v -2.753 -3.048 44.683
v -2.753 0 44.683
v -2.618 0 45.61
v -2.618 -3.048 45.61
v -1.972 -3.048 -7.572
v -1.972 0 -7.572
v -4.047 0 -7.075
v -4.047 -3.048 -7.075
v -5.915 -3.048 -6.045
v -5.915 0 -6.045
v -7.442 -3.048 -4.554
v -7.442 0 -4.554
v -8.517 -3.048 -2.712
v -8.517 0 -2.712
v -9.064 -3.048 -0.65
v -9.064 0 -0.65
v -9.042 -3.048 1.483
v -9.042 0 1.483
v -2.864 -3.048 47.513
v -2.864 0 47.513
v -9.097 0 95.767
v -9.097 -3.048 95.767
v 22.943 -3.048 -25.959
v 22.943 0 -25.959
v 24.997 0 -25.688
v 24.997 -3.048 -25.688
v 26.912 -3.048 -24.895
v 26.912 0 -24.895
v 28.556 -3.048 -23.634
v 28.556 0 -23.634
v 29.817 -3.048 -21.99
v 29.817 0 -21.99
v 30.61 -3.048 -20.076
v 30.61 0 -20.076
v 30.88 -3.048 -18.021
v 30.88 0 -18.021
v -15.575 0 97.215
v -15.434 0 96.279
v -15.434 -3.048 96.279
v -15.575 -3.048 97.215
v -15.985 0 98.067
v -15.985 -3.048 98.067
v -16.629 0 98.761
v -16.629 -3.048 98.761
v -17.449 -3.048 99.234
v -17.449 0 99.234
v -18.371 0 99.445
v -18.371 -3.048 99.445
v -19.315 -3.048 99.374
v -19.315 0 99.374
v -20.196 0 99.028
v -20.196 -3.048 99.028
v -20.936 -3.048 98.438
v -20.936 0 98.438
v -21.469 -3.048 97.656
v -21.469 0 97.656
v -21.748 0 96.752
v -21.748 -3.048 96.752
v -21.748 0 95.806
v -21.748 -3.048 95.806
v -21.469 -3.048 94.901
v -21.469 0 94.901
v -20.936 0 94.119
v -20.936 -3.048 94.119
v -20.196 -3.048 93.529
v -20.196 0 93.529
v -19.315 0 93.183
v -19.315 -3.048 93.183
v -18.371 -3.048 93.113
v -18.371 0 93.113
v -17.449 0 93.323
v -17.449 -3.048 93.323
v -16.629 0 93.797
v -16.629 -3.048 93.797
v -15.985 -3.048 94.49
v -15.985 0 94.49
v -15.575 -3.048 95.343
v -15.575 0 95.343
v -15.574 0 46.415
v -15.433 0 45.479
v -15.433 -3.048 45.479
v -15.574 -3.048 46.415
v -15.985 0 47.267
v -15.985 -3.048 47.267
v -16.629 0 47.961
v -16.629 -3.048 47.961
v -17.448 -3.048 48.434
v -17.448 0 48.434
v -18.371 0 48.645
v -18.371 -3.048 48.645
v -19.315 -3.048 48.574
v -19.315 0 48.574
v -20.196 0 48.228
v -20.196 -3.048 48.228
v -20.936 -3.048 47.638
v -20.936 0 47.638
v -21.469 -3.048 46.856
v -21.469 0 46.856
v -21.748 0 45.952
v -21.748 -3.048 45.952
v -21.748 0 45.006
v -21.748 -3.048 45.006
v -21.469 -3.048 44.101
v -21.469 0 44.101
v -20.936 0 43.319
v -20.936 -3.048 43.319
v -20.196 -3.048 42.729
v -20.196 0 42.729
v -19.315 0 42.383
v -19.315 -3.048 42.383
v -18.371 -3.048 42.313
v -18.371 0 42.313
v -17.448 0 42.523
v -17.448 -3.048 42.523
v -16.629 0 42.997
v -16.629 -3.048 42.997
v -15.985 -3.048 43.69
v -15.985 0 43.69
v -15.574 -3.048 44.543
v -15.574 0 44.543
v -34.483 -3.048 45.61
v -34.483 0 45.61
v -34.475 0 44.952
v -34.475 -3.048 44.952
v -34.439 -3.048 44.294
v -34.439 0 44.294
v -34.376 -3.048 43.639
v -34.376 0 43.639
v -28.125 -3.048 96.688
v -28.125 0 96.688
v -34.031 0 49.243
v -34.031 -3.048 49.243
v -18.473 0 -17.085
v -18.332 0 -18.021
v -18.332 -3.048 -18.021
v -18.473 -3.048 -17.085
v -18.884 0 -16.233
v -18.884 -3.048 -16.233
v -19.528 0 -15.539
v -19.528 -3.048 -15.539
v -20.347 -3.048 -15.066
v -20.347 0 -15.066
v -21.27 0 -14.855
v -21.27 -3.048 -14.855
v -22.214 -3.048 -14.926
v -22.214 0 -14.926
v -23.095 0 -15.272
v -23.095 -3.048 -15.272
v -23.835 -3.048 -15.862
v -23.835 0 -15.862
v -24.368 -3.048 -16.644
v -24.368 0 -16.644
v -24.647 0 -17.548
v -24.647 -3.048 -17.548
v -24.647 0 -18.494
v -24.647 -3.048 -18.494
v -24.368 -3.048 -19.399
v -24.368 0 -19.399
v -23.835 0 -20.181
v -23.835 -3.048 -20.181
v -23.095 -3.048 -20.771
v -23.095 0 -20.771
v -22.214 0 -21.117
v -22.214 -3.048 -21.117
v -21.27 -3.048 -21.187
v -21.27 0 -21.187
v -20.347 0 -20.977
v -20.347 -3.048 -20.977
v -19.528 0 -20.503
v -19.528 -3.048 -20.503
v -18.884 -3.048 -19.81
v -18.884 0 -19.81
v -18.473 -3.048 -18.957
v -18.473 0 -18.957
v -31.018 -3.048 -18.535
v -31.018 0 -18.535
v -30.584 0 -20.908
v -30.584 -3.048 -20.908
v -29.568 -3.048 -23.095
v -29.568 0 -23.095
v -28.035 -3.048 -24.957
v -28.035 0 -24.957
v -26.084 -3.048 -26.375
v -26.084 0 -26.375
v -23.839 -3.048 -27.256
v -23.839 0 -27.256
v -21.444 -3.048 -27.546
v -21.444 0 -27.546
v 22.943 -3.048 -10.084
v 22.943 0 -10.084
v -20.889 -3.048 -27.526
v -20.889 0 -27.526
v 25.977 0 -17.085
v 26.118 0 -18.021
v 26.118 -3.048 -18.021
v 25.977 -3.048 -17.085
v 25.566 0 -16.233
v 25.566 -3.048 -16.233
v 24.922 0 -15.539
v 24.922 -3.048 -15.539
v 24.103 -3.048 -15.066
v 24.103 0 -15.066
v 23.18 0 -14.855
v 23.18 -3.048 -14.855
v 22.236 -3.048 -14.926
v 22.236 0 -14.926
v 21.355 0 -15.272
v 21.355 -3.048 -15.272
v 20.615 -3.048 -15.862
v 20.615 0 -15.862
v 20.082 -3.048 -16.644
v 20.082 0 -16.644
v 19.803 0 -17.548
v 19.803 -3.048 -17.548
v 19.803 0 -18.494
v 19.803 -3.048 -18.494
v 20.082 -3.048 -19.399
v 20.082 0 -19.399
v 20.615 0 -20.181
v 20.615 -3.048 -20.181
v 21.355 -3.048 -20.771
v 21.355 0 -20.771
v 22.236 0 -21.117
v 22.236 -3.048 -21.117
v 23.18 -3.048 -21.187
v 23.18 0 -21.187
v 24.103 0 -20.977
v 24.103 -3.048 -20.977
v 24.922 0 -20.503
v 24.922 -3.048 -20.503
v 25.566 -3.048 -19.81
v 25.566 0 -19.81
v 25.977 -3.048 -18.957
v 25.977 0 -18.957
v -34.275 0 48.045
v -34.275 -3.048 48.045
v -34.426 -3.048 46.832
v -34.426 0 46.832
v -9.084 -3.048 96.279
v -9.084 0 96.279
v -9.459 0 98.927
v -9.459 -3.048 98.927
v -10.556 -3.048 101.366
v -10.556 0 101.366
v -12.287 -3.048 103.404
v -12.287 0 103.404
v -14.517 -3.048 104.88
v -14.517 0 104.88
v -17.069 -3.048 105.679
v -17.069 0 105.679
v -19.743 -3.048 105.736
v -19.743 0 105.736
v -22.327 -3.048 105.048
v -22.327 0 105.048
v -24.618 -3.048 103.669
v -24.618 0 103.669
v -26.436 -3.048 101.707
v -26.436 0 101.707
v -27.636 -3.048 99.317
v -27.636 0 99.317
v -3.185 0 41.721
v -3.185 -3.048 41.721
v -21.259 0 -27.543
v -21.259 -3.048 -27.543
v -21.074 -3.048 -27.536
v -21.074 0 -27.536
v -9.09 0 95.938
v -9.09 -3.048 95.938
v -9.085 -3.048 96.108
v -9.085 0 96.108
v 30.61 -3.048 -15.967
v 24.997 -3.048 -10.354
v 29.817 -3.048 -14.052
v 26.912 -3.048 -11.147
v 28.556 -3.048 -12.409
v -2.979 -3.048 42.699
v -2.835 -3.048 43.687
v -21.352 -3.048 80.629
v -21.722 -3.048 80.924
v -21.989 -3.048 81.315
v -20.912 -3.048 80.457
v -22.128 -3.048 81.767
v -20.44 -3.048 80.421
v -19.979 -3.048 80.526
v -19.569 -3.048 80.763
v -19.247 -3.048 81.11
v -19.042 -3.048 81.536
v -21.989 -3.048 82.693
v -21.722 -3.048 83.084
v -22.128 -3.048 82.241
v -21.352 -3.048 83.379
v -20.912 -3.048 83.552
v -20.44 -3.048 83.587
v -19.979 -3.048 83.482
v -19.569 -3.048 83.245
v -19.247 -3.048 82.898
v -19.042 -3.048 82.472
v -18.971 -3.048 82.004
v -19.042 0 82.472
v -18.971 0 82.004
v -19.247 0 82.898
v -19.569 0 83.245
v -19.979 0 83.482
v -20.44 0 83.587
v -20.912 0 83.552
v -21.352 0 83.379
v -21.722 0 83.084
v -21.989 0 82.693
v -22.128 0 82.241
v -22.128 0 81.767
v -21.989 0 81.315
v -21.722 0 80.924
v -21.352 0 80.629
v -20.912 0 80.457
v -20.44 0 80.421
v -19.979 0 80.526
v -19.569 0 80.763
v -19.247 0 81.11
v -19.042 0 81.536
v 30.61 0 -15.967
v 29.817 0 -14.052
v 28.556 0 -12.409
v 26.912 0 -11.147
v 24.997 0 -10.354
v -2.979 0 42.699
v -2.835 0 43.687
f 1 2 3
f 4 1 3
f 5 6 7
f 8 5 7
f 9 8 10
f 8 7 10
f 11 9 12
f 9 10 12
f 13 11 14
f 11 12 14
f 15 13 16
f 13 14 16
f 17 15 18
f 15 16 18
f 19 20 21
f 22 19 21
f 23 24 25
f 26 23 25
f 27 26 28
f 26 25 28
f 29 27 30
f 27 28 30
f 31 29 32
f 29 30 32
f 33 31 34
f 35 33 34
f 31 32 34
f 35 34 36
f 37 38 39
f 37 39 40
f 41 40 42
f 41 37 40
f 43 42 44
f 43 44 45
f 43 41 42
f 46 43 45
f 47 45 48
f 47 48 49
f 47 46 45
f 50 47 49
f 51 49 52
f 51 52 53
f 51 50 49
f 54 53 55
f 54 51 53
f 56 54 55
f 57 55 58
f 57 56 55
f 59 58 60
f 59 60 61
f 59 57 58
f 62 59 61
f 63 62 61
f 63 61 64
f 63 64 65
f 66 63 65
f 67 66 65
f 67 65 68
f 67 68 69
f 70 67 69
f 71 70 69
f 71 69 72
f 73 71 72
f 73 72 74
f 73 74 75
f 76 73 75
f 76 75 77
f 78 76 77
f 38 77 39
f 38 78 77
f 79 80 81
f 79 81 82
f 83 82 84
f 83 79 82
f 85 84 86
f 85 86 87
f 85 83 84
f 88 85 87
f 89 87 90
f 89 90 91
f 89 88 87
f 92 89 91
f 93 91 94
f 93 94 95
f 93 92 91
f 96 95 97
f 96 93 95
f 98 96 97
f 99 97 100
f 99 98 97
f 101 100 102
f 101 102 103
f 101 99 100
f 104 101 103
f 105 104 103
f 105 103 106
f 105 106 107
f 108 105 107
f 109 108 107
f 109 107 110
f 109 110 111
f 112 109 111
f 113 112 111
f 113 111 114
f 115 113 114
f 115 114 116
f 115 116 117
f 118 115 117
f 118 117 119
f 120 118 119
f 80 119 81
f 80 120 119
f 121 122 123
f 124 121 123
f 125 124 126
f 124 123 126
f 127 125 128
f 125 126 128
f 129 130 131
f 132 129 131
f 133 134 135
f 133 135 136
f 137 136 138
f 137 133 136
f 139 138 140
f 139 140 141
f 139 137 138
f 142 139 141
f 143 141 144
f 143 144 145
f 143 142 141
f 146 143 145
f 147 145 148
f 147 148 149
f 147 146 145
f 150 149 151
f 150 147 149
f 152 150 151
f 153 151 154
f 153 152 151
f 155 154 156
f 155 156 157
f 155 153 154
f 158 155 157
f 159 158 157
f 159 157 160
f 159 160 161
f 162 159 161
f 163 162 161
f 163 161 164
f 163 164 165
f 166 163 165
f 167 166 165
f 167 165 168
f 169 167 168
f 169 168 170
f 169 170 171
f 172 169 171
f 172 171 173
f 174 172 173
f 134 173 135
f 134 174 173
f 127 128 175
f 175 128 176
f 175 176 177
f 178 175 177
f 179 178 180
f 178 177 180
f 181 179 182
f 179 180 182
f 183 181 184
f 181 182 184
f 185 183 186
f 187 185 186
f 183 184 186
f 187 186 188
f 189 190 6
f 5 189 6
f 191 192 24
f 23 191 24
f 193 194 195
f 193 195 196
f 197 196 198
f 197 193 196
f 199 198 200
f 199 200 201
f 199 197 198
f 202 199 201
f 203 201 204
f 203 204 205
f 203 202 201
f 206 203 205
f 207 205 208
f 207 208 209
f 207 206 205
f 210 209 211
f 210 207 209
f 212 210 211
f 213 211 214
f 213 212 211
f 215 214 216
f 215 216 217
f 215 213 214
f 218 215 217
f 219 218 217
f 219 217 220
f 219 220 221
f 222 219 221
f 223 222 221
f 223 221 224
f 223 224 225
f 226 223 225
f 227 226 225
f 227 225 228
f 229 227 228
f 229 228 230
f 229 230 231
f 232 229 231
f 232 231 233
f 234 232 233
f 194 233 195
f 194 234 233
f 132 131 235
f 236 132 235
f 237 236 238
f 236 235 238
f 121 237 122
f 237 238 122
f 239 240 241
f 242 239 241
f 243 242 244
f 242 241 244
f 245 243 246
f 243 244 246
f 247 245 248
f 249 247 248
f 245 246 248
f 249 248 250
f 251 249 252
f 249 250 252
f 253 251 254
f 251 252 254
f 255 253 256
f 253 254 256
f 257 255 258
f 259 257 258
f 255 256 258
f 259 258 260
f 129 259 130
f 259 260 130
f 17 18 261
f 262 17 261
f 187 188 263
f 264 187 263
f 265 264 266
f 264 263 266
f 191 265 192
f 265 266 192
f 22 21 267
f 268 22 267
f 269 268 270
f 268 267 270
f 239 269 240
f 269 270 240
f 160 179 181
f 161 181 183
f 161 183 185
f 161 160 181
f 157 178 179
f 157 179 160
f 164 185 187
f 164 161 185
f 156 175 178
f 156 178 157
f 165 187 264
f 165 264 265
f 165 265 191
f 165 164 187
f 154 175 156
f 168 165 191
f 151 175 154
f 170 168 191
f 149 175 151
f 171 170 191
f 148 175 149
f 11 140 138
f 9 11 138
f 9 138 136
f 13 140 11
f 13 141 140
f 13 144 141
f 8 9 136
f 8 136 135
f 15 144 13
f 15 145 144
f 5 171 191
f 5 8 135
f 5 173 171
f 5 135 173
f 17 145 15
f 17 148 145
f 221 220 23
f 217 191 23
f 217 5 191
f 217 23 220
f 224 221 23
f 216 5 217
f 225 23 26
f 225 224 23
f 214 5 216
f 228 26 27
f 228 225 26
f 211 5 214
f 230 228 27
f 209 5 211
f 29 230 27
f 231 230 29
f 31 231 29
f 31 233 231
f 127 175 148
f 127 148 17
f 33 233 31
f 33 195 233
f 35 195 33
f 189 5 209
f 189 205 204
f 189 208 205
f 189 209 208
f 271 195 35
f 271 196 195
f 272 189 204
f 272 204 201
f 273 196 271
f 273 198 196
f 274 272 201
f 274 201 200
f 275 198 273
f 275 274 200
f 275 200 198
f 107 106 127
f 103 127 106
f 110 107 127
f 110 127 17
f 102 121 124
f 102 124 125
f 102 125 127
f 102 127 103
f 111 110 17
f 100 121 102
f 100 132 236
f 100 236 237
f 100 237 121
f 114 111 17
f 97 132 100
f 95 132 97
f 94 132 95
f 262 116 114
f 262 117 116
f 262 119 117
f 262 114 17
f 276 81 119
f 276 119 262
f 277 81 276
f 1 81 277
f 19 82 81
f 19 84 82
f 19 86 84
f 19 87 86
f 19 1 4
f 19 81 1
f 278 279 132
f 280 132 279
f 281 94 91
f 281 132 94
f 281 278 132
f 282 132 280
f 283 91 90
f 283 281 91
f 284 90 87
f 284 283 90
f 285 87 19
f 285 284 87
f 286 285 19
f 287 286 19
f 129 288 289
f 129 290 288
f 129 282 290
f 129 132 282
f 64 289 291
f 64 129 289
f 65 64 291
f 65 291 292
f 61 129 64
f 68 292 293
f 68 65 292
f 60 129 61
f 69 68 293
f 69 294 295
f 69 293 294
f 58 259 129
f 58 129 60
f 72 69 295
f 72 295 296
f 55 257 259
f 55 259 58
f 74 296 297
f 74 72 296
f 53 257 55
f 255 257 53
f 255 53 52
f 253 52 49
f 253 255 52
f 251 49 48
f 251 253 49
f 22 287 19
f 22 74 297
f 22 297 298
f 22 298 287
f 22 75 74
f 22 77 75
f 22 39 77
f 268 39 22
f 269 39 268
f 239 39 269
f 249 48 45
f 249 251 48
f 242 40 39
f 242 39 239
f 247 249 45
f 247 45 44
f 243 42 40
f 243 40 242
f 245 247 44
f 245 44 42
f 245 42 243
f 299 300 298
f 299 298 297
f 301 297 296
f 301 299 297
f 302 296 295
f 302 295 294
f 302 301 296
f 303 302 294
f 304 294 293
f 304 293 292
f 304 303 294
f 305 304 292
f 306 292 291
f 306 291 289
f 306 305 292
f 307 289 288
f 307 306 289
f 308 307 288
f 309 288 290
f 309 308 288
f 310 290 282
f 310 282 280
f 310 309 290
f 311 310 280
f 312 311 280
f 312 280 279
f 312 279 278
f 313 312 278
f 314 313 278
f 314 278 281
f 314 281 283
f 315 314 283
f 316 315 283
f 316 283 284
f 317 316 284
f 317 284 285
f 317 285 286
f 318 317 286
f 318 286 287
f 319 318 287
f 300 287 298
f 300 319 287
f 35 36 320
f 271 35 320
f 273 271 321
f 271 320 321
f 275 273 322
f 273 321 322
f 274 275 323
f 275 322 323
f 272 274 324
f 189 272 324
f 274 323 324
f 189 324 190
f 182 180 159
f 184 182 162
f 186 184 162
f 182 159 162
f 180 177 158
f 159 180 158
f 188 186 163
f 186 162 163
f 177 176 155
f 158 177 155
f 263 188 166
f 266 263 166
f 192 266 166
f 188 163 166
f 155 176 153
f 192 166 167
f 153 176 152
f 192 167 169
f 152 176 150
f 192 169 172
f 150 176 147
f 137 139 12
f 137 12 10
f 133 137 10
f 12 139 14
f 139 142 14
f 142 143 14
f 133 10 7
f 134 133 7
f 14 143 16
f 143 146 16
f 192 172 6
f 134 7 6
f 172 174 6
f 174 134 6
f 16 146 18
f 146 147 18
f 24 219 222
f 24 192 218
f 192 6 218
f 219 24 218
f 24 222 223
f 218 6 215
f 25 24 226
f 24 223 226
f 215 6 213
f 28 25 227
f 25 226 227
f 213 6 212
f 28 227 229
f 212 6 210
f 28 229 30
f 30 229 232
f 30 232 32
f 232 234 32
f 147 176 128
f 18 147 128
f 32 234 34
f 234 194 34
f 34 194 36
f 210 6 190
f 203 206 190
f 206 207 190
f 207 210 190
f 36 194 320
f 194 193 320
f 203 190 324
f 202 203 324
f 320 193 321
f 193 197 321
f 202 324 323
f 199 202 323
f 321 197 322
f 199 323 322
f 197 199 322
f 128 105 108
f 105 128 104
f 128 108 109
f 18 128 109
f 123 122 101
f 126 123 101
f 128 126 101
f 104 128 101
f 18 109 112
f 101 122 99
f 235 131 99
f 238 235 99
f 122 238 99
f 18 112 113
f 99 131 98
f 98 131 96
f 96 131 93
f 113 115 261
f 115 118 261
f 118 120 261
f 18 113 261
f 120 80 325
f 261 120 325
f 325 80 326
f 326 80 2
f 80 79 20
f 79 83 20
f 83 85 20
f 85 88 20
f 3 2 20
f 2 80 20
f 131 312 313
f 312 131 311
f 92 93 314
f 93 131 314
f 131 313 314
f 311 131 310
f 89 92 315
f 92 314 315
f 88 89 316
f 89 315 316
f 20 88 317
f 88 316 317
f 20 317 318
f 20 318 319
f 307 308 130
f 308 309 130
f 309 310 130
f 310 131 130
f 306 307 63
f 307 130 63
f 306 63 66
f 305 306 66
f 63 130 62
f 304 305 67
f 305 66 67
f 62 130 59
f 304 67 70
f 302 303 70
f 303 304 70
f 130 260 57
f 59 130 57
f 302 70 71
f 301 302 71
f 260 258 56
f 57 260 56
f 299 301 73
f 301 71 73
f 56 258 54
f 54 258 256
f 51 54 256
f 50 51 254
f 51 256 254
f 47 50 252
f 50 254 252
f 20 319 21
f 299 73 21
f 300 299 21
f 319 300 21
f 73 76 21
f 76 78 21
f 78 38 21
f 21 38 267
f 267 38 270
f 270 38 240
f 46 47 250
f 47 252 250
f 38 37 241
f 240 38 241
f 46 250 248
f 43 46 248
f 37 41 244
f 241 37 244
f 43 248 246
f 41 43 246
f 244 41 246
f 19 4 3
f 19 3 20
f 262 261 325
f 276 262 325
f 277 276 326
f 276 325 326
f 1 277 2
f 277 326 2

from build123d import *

# Parameters (mm, degrees)
F0_R     = 3.175
F0_R_2   = 1.5872946887
F1_DEPTH = 3.048


with BuildPart() as f1:
    # F0 (on Front) → F1 (new body)
    with BuildSketch(Plane.XZ):
        with BuildLine():
            ThreePointArc((-9.0974841174, 95.7674032941), (-9.0871801878, 96.0230192533), (-9.0837447185, 96.2788197363))
            ThreePointArc((-9.0837447185, 96.2788197363), (-18.4042625744, 105.801624578), (-28.124965097, 96.6876897734))
            ThreePointArc((-28.124965097, 96.6876897734), (-19.0688946406, 86.764941082), (-9.0974841174, 95.7674032941))
        make_face()
        with Locations((-18.6087447185, 96.2788197363)):
            Circle(F0_R, mode=Mode.SUBTRACT)
        with BuildLine():
            ThreePointArc((-9.0974841174, 95.7674032941), (-19.0688946406, 86.764941082), (-28.124965097, 96.6876897734))
            Line((-28.124965097, 96.6876897734), (-34.0306231002, 49.2433344929))
            ThreePointArc((-34.0306231002, 49.2433344929), (-17.7281897242, 61.3293971023), (-2.8642383786, 47.5125525358))
            Line((-2.8642383786, 47.5125525358), (-9.0974841174, 95.7674032941))
        make_face()
        with Locations((-20.5585247247, 82.0040197363)):
            Circle(F0_R_2, mode=Mode.SUBTRACT)
        with BuildLine():
            Line((-34.4828878032, 45.6099701438), (-34.0306231002, 49.2433344929))
            ThreePointArc((-34.0306231002, 49.2433344929), (-34.3618557694, 47.4397347289), (-34.4828878032, 45.6099701438))
        make_face()
        with BuildLine():
            ThreePointArc((-2.8642383786, 47.5125525358), (-17.7281897242, 61.3293971023), (-34.0306231002, 49.2433344929))
            Line((-34.0306231002, 49.2433344929), (-34.4828878032, 45.6099701438))
            Line((-34.4828878032, 45.6099701438), (-34.376407934, 43.6385798228))
            ThreePointArc((-34.376407934, 43.6385798228), (-19.5826293255, 29.6337397487), (-3.1846463922, 41.7208232156))
            Line((-3.1846463922, 41.7208232156), (-2.7533729136, 44.6833300781))
            ThreePointArc((-2.7533729136, 44.6833300781), (-2.7384161803, 45.0809499292), (-2.7334295582, 45.4788197363))
            ThreePointArc((-2.7334295582, 45.4788197363), (-2.7661655158, 46.4977873569), (-2.8642383786, 47.5125525358))
        make_face()
        with Locations((-18.6084295582, 45.4788197363)):
            Circle(F0_R, mode=Mode.SUBTRACT)
        with BuildLine():
            Line((-2.6184752397, 45.6099701438), (-2.8642383786, 47.5125525358))
            ThreePointArc((-2.8642383786, 47.5125525358), (-2.7661655158, 46.4977873569), (-2.7334295582, 45.4788197363))
            ThreePointArc((-2.7334295582, 45.4788197363), (-2.7384161803, 45.0809499292), (-2.7533729136, 44.6833300781))
            Line((-2.7533729136, 44.6833300781), (-2.6184752397, 45.6099701438))
        make_face()
        with BuildLine():
            Line((-34.376407934, 43.6385798228), (-34.4828878032, 45.6099701438))
            ThreePointArc((-34.4828878032, 45.6099701438), (-34.4603235704, 44.6226181096), (-34.376407934, 43.6385798228))
        make_face()
        with BuildLine():
            ThreePointArc((-3.1846463922, 41.7208232156), (-19.5826293255, 29.6337397487), (-34.376407934, 43.6385798228))
            Line((-34.376407934, 43.6385798228), (-31.0182580763, -18.5349012397))
            ThreePointArc((-31.0182580763, -18.5349012397), (-21.7640756728, -8.4996467927), (-11.9821216689, -18.0211802637))
            ThreePointArc((-11.9821216689, -18.0211802637), (-14.5569871682, -24.5343404354), (-20.8894718888, -27.5261333803))
            Line((-20.8894718888, -27.5261333803), (22.9428783311, -25.9586802637))
            ThreePointArc((22.9428783311, -25.9586802637), (15.0053783311, -18.0211802637), (22.9428783311, -10.0836802637))
            Line((22.9428783311, -10.0836802637), (-1.9724256736, -7.5720420447))
            ThreePointArc((-1.9724256736, -7.5720420447), (-7.4415456853, -4.5544233197), (-9.0423034299, 1.4833636188))
            Line((-9.0423034299, 1.4833636188), (-3.1846463922, 41.7208232156))
        make_face()
        with BuildLine():
            ThreePointArc((-3.1846463922, 41.7208232156), (-2.899019426, 43.191887665), (-2.7533729136, 44.6833300781))
            Line((-2.7533729136, 44.6833300781), (-3.1846463922, 41.7208232156))
        make_face()
        with BuildLine():
            ThreePointArc((-11.9821216689, -18.0211802637), (-21.7640756728, -8.4996467927), (-31.0182580763, -18.5349012397))
            ThreePointArc((-31.0182580763, -18.5349012397), (-28.0353179292, -24.957193426), (-21.4442641508, -27.5459728563))
            Line((-21.4442641508, -27.5459728563), (-20.8894718888, -27.5261333803))
            ThreePointArc((-20.8894718888, -27.5261333803), (-14.5569871682, -24.5343404354), (-11.9821216689, -18.0211802637))
        make_face()
        with Locations((-21.5071216689, -18.0211802637)):
            Circle(F0_R, mode=Mode.SUBTRACT)
        with BuildLine():
            Line((-20.8894718888, -27.5261333803), (-21.4442641508, -27.5459728563))
            ThreePointArc((-21.4442641508, -27.5459728563), (-21.1667234508, -27.540095856), (-20.8894718888, -27.5261333803))
        make_face()
        with BuildLine():
            ThreePointArc((30.8803783311, -18.0211802637), (28.5555384067, -12.408520188), (22.9428783311, -10.0836802637))
            ThreePointArc((22.9428783311, -10.0836802637), (15.0053783311, -18.0211802637), (22.9428783311, -25.9586802637))
            ThreePointArc((22.9428783311, -25.9586802637), (28.5555384067, -23.6338403394), (30.8803783311, -18.0211802637))
        make_face()
        with Locations((22.9428783311, -18.0211802637)):
            Circle(F0_R, mode=Mode.SUBTRACT)
    extrude(amount=F1_DEPTH)


solid = f1.part
